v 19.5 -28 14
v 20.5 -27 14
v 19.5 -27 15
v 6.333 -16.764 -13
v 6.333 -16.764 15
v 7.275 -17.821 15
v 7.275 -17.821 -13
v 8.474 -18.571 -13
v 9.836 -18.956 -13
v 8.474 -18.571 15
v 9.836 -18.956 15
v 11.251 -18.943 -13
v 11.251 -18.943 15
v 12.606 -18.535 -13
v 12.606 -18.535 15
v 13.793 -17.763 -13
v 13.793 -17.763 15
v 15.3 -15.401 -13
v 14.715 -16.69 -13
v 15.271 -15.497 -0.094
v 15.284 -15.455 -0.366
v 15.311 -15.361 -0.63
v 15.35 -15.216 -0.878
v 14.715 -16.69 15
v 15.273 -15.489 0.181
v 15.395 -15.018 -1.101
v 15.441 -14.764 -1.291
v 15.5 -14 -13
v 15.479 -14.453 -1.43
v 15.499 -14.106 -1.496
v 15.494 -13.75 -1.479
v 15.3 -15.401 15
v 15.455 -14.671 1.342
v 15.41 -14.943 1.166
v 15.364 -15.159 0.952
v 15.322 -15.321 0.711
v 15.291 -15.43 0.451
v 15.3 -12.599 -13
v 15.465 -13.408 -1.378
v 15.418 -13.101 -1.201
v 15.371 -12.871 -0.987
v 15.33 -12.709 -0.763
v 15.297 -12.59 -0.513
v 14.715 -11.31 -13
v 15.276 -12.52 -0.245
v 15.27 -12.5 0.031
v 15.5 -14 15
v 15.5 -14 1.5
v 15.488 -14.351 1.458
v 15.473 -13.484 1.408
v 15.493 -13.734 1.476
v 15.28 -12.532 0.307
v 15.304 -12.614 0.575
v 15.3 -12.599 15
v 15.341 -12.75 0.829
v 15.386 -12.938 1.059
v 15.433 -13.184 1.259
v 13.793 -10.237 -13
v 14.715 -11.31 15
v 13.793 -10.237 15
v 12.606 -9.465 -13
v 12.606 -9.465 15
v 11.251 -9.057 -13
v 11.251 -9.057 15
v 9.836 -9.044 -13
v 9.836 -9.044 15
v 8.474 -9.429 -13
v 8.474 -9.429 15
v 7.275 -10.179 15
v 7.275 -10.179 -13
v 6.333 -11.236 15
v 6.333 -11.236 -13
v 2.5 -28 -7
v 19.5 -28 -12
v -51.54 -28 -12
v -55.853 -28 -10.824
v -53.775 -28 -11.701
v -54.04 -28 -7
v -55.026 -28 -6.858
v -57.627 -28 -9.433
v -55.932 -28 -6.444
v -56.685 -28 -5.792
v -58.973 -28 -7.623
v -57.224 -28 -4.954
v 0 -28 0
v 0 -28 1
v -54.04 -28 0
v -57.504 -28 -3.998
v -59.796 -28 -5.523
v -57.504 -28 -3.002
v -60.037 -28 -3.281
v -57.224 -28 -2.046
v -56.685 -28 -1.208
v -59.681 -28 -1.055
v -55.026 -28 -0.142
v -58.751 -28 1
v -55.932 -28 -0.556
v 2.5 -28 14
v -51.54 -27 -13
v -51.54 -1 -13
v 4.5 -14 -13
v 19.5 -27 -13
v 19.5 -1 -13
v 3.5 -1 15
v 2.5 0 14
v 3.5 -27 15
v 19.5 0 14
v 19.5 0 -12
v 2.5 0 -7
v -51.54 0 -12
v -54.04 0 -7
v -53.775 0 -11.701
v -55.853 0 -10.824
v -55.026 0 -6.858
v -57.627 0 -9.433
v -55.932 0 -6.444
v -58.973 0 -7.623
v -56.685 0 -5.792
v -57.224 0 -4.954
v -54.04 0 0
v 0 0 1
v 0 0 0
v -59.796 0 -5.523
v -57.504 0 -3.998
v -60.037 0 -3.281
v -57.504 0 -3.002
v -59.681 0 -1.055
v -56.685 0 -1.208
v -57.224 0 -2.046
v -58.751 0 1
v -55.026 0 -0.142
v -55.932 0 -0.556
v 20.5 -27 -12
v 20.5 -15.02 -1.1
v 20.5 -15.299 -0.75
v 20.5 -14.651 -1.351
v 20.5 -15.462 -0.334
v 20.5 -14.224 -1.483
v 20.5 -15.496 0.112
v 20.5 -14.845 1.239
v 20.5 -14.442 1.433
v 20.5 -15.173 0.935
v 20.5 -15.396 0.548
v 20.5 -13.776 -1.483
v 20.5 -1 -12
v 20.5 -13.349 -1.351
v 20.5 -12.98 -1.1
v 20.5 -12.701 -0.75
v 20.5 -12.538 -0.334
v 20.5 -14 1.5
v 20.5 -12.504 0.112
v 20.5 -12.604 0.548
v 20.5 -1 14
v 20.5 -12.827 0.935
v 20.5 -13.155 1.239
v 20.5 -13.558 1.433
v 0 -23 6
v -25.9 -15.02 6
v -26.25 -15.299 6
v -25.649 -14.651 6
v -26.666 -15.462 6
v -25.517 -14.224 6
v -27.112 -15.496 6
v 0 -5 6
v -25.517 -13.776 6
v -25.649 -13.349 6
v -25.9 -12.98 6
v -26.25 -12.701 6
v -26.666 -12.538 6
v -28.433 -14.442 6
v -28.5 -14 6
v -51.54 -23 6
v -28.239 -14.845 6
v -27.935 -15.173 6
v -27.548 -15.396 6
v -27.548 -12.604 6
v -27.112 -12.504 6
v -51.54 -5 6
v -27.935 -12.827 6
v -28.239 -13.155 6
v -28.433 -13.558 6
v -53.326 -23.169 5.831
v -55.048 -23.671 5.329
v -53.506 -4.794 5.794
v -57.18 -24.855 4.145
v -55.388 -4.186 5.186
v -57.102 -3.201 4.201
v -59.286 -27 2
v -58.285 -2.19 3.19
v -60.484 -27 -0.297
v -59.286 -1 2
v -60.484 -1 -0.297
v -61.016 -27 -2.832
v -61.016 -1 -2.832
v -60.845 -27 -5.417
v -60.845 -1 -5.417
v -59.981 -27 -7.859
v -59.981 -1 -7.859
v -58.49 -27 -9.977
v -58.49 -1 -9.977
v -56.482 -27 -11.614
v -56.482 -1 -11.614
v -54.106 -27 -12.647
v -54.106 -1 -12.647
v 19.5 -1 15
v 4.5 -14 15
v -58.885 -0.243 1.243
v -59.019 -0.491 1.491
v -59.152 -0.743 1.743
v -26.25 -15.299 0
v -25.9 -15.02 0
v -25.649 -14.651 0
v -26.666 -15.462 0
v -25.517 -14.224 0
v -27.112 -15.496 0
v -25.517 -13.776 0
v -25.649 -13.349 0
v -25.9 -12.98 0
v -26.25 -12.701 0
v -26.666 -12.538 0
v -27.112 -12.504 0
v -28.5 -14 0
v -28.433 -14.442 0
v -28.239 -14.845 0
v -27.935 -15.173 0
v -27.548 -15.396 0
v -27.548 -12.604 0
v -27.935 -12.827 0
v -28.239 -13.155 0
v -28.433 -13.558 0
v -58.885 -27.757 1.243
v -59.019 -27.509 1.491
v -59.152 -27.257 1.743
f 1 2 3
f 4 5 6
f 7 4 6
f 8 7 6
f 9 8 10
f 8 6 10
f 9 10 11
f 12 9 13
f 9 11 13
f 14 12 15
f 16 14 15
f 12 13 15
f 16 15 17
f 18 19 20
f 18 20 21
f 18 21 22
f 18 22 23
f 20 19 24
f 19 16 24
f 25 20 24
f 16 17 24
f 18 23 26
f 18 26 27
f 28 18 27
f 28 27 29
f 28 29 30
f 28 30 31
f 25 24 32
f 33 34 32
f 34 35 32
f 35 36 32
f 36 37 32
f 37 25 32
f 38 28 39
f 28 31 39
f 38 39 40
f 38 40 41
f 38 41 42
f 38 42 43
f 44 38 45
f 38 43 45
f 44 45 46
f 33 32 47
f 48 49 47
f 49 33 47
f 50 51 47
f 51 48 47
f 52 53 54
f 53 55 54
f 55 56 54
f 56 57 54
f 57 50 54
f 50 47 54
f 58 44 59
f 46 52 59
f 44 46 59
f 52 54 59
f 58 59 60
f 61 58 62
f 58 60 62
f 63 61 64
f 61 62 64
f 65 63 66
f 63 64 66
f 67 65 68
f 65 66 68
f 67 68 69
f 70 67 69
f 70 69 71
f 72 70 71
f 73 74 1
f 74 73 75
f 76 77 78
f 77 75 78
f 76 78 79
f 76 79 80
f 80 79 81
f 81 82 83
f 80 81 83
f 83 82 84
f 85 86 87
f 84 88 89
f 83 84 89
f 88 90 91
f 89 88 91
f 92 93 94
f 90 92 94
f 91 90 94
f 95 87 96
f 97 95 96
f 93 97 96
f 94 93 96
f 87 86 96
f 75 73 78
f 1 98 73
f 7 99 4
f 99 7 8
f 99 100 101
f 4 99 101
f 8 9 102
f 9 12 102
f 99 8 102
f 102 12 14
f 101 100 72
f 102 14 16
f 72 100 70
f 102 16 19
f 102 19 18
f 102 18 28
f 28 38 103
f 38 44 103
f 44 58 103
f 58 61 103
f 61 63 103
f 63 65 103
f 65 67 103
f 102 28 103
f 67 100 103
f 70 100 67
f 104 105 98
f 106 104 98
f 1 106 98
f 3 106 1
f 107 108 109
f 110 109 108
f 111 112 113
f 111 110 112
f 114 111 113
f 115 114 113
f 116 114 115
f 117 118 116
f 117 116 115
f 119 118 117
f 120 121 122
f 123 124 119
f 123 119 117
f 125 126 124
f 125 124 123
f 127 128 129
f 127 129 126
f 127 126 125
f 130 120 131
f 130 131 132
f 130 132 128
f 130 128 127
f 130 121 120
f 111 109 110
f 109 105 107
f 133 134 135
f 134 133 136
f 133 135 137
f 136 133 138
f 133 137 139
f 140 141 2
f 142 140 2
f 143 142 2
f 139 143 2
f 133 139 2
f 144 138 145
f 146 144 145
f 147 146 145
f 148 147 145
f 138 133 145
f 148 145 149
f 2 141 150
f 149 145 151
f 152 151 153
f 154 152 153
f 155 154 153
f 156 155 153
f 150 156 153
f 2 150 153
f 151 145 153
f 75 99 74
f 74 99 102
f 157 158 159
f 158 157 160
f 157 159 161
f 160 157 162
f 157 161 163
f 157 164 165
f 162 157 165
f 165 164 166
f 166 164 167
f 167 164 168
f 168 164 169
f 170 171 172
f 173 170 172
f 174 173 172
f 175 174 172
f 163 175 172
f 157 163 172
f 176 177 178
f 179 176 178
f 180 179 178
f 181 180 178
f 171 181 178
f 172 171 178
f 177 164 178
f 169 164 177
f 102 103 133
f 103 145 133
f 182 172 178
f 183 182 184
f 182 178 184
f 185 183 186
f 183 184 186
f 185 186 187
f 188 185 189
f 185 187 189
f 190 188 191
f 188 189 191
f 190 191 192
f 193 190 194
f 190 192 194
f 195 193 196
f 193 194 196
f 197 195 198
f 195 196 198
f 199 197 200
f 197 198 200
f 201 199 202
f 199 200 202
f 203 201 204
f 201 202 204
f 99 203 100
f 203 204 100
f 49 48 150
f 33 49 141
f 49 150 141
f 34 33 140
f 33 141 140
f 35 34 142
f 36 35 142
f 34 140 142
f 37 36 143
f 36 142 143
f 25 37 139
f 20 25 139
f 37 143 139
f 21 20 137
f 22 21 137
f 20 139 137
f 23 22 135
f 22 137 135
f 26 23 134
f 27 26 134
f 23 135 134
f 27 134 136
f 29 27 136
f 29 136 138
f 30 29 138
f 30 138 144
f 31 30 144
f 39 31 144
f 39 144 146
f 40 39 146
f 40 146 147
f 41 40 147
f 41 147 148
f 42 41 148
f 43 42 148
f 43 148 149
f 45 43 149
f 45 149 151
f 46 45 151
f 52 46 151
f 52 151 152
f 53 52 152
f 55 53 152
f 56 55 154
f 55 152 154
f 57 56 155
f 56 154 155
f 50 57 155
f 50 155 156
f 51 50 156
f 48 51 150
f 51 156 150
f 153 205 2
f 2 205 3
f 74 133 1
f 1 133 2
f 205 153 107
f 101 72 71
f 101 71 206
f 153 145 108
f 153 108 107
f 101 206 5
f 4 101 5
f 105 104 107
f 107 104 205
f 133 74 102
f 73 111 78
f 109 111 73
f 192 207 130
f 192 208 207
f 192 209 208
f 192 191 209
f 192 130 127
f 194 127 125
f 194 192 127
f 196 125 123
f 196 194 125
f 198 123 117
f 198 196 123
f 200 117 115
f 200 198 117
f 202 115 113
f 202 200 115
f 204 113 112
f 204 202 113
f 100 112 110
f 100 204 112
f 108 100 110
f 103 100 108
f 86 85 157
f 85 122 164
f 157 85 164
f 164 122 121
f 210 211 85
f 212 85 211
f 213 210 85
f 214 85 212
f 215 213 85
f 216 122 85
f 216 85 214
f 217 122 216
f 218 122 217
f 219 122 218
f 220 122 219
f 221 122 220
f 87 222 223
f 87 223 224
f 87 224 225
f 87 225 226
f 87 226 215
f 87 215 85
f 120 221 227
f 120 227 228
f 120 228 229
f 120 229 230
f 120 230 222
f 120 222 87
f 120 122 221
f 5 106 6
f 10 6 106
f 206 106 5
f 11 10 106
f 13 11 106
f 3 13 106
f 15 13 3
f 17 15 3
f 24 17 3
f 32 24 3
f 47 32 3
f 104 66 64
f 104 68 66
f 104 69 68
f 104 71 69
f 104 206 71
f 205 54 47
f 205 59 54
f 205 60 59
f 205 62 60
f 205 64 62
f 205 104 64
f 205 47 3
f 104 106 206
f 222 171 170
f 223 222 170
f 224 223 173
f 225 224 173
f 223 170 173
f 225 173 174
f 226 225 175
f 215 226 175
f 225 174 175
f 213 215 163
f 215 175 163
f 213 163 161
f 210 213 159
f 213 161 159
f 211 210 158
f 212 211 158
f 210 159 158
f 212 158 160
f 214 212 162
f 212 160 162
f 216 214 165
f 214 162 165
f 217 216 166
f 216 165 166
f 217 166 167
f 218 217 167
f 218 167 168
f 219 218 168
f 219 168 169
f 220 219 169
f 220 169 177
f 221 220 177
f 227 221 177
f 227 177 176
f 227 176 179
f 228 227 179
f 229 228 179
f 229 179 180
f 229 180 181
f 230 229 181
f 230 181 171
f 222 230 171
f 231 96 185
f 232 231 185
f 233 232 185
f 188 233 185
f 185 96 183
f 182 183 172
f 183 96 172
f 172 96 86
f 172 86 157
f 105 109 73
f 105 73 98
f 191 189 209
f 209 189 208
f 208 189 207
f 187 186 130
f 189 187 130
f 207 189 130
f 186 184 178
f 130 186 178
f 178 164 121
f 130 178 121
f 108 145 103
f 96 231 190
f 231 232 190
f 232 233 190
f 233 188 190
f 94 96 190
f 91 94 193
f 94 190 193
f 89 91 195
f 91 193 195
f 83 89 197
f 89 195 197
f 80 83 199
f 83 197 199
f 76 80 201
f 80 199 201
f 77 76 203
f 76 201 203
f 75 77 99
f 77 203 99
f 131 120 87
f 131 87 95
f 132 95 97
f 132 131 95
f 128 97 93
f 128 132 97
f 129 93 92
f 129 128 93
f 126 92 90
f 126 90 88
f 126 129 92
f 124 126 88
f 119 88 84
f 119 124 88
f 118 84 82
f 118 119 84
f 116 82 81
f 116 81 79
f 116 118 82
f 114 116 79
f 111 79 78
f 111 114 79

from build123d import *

# Parameters (mm, degrees)
PAD_DEPTH       = 28
POCKET_DEPTH    = 100
SKETCH002_R     = 1.5
POCKET001_DEPTH = 7
POCKET002_DEPTH = 40
SKETCH004_R     = 1.5
POCKET003_DEPTH = 10
CHAMFER_SIZE    = 1


with BuildPart() as part:
    # Sketch → Pad (new body)
    with BuildSketch(Plane.XZ):
        with BuildLine():
            Line((0, 0), (-54.04, 0))
            ThreePointArc((-54.04, 0), (-57.54, -3.5), (-54.04, -7))
            Line((-54.04, -7), (2.5, -7))
            Line((2.5, -7), (2.5, 15))
            Line((2.5, 15), (20.5, 15))
            Line((20.5, -13), (20.5, 15))
            Line((-51.54, -13), (20.5, -13))
            ThreePointArc((-51.54, 6), (-61.04, -3.5), (-51.54, -13))
            Line((0, 6), (-51.54, 6))
            Line((0, 0), (0, 6))
        make_face()
    extrude(amount=PAD_DEPTH)

    # Sketch001 (on Face10 of Pad) → Pocket (cut)
    with BuildSketch(Plane(origin=(0, 0, 0), x_dir=(0, 0, 1), z_dir=(1, 0, 0))):
        Polygon((1, 28), (6, 23), (6, 28), align=None)
        Polygon((6, 5), (1, 0), (6, 0), align=None)
    extrude(amount=-POCKET_DEPTH, mode=Mode.SUBTRACT)

    # Sketch002 (on Face7 of Pocket) → Pocket001 (cut)
    with BuildSketch(Plane(origin=(0, 0, 6), x_dir=(-1, 0, 0), z_dir=(0, 0, 1))):
        with Locations((27, 14)):
            Circle(SKETCH002_R)
    extrude(amount=-POCKET001_DEPTH, mode=Mode.SUBTRACT)

    # Sketch003 (on Face13 of Pocket001) → Pocket002 (cut)
    with BuildSketch(Plane(origin=(0, 0, 15), x_dir=(-1, 0, 0), z_dir=(0, 0, 1))):
        with BuildLine():
            ThreePointArc((-6.333333, 16.763854), (-15.5, 14), (-6.333333, 11.236146))
            Line((-6.333333, 11.236146), (-4.5, 14))
            Line((-4.5, 14), (-6.333333, 16.763854))
        make_face()
    extrude(amount=-POCKET002_DEPTH, mode=Mode.SUBTRACT)

    # Sketch004 (on Face12 of Pocket002) → Pocket003 (cut)
    with BuildSketch(Plane(origin=(20.5, 0, 0), x_dir=(0, 0, 1), z_dir=(1, 0, 0))):
        with Locations((0, 14)):
            Circle(SKETCH004_R)
    extrude(amount=-POCKET003_DEPTH, mode=Mode.SUBTRACT)

    # Chamfer
    chamfer_edges = [part.edges().sort_by_distance(p)[0] for p in [
        (-59.694753, -28, -8.373397),
        (-15.52, -28, -13),
        (20.5, -28, 1),
        (20.5, -14, -13),
        (20.5, 0, 1),
        (20.5, -14, 15),
        (11.5, 0, 15),
        (11.5, -28, 15),
        (2.5, -14, 15),
        (-15.52, 0, -13),
        (-59.694753, 0, -8.373397),
    ]]
    chamfer(chamfer_edges, length=CHAMFER_SIZE)


solid = part.part
